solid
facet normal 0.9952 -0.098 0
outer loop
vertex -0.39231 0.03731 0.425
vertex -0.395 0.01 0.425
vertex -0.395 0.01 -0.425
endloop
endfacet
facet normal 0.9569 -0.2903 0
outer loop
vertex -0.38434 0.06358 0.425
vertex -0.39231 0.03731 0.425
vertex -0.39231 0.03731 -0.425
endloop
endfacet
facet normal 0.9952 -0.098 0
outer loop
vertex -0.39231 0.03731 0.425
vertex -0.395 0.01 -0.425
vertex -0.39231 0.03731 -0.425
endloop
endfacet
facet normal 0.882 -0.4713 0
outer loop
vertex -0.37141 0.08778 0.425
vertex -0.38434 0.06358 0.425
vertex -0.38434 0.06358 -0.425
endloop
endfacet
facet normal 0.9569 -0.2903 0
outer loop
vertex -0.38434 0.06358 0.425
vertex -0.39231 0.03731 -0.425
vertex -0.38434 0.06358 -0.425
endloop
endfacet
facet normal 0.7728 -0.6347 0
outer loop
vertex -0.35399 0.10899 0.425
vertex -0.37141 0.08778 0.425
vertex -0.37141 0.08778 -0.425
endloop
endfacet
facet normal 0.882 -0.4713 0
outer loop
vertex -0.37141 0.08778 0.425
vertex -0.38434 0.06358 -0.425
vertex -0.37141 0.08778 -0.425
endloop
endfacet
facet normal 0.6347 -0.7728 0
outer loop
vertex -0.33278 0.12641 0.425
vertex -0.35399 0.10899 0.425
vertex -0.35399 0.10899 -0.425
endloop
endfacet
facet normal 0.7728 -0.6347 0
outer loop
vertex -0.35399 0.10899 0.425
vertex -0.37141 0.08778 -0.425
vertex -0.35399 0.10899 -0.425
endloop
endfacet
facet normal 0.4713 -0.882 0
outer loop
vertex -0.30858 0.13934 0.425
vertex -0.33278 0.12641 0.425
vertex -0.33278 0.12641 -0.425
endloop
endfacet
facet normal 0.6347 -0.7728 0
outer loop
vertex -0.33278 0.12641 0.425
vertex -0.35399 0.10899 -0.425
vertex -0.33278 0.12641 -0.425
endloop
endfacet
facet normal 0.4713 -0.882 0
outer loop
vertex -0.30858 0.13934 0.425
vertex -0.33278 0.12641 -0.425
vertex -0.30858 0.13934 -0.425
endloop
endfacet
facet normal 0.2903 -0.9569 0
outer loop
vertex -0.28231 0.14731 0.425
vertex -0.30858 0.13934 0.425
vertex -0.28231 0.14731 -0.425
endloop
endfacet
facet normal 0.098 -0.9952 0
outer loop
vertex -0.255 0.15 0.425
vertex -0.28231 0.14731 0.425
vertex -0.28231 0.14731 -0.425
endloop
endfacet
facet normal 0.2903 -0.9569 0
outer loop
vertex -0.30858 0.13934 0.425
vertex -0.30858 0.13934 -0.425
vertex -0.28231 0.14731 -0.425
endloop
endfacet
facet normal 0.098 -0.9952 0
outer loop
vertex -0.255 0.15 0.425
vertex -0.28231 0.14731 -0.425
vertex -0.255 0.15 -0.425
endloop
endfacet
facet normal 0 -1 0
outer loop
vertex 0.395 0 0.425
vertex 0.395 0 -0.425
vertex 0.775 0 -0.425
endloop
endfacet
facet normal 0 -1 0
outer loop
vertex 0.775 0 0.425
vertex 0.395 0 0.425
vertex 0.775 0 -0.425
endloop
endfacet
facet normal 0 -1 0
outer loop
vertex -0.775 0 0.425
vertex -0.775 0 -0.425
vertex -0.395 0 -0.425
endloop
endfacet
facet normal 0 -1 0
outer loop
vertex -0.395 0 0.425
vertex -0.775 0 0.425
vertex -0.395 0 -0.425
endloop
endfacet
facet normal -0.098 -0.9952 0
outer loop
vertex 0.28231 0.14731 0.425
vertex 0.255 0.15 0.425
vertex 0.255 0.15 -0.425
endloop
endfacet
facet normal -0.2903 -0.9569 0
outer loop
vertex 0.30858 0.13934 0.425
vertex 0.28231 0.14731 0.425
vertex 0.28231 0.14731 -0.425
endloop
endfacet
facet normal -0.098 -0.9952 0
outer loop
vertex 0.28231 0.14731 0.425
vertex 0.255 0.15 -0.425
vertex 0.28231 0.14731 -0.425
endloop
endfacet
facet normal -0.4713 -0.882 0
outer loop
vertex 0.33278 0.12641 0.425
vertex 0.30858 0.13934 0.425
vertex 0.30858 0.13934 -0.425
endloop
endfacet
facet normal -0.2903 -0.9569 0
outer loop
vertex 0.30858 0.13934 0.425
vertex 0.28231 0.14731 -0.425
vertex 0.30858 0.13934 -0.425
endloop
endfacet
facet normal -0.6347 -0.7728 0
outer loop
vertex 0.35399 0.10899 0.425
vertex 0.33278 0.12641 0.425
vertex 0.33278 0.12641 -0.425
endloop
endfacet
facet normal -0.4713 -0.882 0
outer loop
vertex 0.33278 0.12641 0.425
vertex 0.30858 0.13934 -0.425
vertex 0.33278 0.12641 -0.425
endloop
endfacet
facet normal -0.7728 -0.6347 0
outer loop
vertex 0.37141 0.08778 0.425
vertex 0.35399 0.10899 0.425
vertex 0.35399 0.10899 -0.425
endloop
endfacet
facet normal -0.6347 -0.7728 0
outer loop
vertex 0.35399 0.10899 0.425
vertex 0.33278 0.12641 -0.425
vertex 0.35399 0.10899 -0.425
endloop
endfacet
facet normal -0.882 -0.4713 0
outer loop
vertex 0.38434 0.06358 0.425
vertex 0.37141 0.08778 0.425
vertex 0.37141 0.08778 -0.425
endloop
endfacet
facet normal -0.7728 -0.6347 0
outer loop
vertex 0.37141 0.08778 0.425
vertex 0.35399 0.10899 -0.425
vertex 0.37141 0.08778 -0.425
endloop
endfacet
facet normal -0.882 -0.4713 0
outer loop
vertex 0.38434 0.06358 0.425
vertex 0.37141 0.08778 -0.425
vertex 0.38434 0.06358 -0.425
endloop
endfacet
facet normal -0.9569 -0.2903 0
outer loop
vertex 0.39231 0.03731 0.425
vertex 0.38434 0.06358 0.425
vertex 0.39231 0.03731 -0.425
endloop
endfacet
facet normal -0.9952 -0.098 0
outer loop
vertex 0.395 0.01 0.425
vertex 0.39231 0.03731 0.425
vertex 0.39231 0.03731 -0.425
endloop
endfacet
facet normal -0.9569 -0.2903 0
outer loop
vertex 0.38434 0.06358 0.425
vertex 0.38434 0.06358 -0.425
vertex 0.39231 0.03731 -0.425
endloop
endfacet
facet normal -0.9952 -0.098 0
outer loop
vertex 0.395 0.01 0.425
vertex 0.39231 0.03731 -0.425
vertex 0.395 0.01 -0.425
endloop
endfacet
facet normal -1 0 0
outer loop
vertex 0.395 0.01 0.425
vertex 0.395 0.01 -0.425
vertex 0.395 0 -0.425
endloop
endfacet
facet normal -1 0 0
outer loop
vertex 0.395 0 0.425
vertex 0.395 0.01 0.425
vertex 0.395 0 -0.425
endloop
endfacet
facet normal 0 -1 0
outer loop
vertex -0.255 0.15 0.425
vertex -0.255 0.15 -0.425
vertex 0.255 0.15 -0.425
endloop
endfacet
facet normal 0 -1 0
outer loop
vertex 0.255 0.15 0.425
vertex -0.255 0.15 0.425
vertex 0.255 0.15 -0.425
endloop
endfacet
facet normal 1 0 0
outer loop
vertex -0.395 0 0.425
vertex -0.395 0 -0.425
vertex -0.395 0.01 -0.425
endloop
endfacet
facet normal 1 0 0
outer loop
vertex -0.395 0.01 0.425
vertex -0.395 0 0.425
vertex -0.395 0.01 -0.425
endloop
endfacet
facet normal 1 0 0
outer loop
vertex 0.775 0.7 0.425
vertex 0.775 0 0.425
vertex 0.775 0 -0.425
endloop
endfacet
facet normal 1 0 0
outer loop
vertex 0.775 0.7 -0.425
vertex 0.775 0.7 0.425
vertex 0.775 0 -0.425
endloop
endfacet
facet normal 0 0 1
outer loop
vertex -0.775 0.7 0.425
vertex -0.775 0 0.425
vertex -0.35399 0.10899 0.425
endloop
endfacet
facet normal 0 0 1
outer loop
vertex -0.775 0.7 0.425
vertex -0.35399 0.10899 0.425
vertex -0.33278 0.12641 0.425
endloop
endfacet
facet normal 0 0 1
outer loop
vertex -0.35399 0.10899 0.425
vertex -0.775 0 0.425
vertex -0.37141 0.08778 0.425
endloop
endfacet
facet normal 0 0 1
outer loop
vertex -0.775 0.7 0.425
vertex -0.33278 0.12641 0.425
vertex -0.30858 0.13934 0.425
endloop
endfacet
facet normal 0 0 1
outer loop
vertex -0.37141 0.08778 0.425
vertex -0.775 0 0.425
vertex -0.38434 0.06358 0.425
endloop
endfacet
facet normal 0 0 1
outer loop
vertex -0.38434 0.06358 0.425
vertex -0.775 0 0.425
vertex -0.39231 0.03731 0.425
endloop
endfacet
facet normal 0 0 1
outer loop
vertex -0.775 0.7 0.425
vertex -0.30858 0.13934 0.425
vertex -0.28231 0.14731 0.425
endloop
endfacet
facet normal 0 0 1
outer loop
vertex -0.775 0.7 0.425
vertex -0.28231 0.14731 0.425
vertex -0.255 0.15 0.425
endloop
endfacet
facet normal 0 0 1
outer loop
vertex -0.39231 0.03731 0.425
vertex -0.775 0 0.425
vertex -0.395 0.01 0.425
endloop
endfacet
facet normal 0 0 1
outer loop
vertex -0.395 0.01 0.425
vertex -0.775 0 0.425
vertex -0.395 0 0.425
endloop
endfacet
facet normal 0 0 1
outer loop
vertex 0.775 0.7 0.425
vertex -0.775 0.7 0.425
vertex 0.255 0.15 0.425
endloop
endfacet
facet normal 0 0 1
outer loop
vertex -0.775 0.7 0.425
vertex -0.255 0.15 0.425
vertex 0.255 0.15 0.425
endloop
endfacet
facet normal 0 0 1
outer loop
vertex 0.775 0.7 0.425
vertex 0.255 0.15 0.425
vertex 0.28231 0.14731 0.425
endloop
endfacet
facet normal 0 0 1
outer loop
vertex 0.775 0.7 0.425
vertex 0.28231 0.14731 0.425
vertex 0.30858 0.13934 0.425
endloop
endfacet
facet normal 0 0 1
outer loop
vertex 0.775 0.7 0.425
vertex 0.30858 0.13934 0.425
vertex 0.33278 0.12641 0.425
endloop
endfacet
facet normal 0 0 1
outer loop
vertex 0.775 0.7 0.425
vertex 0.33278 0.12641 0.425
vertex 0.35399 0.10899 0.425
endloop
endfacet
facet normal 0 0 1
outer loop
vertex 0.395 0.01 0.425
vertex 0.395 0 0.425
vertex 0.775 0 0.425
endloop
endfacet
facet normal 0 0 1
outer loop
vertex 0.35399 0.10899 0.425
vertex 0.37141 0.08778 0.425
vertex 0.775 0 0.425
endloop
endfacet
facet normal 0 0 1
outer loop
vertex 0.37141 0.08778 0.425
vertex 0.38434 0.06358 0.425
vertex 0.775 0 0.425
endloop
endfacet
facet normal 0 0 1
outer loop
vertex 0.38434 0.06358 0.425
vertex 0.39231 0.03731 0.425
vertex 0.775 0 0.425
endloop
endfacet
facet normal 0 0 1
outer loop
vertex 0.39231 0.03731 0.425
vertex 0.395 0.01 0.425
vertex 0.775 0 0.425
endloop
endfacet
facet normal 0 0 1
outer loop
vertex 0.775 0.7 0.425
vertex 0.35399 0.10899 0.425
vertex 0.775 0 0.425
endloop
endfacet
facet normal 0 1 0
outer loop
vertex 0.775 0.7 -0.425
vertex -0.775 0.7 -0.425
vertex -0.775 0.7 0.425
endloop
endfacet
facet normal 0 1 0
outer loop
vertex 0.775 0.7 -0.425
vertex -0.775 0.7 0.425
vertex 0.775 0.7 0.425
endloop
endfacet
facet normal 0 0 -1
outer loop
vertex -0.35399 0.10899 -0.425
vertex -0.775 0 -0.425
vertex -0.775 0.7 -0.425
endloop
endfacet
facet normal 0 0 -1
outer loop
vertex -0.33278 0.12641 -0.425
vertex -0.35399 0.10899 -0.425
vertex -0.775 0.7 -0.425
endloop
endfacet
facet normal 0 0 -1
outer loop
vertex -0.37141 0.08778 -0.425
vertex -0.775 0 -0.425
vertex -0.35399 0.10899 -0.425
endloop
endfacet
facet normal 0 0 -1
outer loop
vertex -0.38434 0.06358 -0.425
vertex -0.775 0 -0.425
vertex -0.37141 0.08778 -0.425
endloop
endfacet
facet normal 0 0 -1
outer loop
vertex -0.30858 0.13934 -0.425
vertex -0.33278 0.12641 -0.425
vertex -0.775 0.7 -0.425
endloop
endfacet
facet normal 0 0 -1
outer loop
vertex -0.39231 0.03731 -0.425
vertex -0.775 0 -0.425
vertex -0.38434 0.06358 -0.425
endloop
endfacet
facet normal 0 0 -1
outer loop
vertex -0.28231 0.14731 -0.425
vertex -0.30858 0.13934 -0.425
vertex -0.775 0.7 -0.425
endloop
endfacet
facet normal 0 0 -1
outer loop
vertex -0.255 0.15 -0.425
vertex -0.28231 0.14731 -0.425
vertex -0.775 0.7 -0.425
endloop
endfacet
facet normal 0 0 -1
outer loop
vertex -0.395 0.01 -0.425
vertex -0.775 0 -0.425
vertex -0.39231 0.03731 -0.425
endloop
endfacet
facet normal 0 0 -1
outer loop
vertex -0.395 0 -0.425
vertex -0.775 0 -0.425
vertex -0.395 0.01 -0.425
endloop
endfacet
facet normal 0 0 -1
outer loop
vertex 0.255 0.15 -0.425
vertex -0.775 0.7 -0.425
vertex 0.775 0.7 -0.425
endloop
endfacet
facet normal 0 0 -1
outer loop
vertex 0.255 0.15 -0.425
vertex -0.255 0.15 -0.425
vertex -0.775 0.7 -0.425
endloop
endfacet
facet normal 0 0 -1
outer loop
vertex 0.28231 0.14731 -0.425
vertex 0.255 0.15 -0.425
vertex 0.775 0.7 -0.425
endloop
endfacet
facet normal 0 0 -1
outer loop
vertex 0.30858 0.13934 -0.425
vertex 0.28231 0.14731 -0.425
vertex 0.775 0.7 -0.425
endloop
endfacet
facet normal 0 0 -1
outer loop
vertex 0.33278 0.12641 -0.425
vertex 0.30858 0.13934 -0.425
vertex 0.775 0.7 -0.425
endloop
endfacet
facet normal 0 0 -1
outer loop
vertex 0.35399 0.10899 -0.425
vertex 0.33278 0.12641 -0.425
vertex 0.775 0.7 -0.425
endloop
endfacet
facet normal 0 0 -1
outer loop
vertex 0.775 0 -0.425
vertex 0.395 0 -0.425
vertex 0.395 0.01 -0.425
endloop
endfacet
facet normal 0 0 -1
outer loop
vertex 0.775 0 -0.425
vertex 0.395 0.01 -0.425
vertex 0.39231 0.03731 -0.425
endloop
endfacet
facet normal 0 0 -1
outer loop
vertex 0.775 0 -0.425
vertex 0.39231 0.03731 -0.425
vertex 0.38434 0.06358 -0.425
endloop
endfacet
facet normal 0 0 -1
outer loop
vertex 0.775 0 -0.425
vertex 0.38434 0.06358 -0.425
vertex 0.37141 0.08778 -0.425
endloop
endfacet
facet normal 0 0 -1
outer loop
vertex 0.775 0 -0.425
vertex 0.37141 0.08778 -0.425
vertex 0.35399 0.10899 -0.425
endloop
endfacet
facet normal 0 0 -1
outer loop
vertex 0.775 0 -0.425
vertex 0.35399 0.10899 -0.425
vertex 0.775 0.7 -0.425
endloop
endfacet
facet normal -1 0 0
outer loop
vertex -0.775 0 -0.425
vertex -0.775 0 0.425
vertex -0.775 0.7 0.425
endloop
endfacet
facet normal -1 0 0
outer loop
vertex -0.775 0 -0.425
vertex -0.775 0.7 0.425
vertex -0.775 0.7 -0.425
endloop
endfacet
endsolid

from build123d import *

# Parameters (mm, degrees)
SKETCH1_W               = 1.55
SKETCH1_H               = 0.85
BOSS_EXTRUDE1_DEPTH     = 0.7
CUT_EXTRUDE1_DEPTH      = 1.425
CUT_EXTRUDE1_DEPTH_BACK = 1.425


with BuildPart() as part:
    # Sketch1 → Boss-Extrude1 (new body)
    with BuildSketch(Plane(origin=(0, 0, 0), x_dir=(1, 0, 0), z_dir=(0, 1, 0))):
        Rectangle(SKETCH1_W, SKETCH1_H)
    extrude(amount=BOSS_EXTRUDE1_DEPTH)

    # Sketch2 → Cut-Extrude1 (cut, two sides)
    with BuildSketch(Plane.XY) as cut_extrude1_sk:
        with BuildLine():
            Line((-0.255, 0.15), (0.255, 0.15))
            ThreePointArc((0.255, 0.15), (0.353994949, 0.108994949), (0.395, 0.01))
            Line((0.395, 0.01), (0.395, 0))
            Line((0.395, 0), (-0.395, 0))
            Line((-0.395, 0), (-0.395, 0.01))
            ThreePointArc((-0.395, 0.01), (-0.353994949, 0.108994949), (-0.255, 0.15))
        make_face()
    extrude(amount=CUT_EXTRUDE1_DEPTH, mode=Mode.SUBTRACT)
    extrude(cut_extrude1_sk.sketch, amount=-CUT_EXTRUDE1_DEPTH_BACK, mode=Mode.SUBTRACT)


solid = part.part
